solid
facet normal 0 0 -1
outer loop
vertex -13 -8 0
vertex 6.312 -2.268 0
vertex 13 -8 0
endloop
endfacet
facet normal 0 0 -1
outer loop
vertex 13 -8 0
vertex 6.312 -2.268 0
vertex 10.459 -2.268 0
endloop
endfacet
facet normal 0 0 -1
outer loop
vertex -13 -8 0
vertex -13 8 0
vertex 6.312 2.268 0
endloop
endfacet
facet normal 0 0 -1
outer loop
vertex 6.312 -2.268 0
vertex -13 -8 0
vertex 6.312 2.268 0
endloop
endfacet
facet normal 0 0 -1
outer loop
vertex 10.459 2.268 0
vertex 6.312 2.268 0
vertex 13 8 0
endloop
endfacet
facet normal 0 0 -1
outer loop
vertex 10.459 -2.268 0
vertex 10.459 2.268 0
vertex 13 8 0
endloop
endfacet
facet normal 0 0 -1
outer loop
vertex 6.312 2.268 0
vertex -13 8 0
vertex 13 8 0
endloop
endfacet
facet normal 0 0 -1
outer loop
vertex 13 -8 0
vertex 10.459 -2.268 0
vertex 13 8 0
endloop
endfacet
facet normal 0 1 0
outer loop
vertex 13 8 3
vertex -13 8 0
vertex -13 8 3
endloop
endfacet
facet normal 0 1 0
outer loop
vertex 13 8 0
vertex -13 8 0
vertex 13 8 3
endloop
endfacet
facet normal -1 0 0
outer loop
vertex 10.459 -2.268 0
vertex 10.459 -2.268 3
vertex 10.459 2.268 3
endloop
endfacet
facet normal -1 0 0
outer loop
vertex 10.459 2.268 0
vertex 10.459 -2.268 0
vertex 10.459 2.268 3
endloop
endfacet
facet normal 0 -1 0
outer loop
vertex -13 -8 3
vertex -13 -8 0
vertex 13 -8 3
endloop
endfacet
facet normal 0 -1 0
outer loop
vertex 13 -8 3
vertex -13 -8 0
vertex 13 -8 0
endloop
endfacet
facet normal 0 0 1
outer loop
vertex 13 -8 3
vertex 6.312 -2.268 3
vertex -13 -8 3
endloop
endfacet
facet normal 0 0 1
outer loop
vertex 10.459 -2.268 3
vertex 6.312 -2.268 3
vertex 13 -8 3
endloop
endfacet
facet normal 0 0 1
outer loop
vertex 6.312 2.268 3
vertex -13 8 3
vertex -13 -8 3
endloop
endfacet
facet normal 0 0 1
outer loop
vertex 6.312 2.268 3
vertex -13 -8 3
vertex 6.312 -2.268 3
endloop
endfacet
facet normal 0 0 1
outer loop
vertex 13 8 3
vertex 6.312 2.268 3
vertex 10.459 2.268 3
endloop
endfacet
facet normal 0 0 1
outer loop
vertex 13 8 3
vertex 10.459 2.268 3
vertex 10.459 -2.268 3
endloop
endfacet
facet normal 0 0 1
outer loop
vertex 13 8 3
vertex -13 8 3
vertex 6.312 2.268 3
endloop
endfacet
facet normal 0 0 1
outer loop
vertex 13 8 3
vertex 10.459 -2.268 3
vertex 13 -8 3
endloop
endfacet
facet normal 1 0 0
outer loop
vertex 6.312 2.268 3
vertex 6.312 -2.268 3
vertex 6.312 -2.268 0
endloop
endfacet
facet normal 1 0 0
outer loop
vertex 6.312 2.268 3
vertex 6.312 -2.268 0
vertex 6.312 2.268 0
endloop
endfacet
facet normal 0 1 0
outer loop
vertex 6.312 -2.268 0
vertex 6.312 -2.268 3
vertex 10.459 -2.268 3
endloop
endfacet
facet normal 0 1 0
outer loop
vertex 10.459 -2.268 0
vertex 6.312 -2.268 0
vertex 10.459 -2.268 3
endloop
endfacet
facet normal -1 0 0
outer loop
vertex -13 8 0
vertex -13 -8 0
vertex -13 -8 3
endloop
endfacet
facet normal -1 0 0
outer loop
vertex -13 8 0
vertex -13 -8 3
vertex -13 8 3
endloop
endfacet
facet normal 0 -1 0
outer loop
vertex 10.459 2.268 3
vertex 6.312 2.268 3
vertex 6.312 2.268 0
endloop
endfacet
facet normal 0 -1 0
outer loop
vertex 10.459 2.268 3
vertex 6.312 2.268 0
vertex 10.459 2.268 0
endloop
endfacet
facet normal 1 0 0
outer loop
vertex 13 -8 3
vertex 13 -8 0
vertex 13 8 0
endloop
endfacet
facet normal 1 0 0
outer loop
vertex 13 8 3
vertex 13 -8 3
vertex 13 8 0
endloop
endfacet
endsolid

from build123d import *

# Parameters (mm, degrees)
IZIM1_W                     = 26
IZIM1_H                     = 16
IZIM1_R                     = 2.072340414
Y_KSEKLIK_EKSTR_ZYON1_DEPTH = 3
IZIM2_W                     = 4.147814154
IZIM2_H                     = 4.535167944
KES_EKSTR_ZYON1_DEPTH       = 10


with BuildPart() as part:
    # Çizim1 → Yükseklik-Ekstrüzyon1 (new body)
    with BuildSketch(Plane.XY):
        Rectangle(IZIM1_W, IZIM1_H)
        with Locations((8.385515416, 0)):
            Circle(IZIM1_R, mode=Mode.SUBTRACT)
    extrude(amount=Y_KSEKLIK_EKSTR_ZYON1_DEPTH)

    # Çizim2 → Kes-Ekstrüzyon1 (cut)
    with BuildSketch(Plane.XY.offset(3)):
        with Locations((8.385515416, 0)):
            Rectangle(IZIM2_W, IZIM2_H)
    extrude(amount=-KES_EKSTR_ZYON1_DEPTH, mode=Mode.SUBTRACT)


solid = part.part
